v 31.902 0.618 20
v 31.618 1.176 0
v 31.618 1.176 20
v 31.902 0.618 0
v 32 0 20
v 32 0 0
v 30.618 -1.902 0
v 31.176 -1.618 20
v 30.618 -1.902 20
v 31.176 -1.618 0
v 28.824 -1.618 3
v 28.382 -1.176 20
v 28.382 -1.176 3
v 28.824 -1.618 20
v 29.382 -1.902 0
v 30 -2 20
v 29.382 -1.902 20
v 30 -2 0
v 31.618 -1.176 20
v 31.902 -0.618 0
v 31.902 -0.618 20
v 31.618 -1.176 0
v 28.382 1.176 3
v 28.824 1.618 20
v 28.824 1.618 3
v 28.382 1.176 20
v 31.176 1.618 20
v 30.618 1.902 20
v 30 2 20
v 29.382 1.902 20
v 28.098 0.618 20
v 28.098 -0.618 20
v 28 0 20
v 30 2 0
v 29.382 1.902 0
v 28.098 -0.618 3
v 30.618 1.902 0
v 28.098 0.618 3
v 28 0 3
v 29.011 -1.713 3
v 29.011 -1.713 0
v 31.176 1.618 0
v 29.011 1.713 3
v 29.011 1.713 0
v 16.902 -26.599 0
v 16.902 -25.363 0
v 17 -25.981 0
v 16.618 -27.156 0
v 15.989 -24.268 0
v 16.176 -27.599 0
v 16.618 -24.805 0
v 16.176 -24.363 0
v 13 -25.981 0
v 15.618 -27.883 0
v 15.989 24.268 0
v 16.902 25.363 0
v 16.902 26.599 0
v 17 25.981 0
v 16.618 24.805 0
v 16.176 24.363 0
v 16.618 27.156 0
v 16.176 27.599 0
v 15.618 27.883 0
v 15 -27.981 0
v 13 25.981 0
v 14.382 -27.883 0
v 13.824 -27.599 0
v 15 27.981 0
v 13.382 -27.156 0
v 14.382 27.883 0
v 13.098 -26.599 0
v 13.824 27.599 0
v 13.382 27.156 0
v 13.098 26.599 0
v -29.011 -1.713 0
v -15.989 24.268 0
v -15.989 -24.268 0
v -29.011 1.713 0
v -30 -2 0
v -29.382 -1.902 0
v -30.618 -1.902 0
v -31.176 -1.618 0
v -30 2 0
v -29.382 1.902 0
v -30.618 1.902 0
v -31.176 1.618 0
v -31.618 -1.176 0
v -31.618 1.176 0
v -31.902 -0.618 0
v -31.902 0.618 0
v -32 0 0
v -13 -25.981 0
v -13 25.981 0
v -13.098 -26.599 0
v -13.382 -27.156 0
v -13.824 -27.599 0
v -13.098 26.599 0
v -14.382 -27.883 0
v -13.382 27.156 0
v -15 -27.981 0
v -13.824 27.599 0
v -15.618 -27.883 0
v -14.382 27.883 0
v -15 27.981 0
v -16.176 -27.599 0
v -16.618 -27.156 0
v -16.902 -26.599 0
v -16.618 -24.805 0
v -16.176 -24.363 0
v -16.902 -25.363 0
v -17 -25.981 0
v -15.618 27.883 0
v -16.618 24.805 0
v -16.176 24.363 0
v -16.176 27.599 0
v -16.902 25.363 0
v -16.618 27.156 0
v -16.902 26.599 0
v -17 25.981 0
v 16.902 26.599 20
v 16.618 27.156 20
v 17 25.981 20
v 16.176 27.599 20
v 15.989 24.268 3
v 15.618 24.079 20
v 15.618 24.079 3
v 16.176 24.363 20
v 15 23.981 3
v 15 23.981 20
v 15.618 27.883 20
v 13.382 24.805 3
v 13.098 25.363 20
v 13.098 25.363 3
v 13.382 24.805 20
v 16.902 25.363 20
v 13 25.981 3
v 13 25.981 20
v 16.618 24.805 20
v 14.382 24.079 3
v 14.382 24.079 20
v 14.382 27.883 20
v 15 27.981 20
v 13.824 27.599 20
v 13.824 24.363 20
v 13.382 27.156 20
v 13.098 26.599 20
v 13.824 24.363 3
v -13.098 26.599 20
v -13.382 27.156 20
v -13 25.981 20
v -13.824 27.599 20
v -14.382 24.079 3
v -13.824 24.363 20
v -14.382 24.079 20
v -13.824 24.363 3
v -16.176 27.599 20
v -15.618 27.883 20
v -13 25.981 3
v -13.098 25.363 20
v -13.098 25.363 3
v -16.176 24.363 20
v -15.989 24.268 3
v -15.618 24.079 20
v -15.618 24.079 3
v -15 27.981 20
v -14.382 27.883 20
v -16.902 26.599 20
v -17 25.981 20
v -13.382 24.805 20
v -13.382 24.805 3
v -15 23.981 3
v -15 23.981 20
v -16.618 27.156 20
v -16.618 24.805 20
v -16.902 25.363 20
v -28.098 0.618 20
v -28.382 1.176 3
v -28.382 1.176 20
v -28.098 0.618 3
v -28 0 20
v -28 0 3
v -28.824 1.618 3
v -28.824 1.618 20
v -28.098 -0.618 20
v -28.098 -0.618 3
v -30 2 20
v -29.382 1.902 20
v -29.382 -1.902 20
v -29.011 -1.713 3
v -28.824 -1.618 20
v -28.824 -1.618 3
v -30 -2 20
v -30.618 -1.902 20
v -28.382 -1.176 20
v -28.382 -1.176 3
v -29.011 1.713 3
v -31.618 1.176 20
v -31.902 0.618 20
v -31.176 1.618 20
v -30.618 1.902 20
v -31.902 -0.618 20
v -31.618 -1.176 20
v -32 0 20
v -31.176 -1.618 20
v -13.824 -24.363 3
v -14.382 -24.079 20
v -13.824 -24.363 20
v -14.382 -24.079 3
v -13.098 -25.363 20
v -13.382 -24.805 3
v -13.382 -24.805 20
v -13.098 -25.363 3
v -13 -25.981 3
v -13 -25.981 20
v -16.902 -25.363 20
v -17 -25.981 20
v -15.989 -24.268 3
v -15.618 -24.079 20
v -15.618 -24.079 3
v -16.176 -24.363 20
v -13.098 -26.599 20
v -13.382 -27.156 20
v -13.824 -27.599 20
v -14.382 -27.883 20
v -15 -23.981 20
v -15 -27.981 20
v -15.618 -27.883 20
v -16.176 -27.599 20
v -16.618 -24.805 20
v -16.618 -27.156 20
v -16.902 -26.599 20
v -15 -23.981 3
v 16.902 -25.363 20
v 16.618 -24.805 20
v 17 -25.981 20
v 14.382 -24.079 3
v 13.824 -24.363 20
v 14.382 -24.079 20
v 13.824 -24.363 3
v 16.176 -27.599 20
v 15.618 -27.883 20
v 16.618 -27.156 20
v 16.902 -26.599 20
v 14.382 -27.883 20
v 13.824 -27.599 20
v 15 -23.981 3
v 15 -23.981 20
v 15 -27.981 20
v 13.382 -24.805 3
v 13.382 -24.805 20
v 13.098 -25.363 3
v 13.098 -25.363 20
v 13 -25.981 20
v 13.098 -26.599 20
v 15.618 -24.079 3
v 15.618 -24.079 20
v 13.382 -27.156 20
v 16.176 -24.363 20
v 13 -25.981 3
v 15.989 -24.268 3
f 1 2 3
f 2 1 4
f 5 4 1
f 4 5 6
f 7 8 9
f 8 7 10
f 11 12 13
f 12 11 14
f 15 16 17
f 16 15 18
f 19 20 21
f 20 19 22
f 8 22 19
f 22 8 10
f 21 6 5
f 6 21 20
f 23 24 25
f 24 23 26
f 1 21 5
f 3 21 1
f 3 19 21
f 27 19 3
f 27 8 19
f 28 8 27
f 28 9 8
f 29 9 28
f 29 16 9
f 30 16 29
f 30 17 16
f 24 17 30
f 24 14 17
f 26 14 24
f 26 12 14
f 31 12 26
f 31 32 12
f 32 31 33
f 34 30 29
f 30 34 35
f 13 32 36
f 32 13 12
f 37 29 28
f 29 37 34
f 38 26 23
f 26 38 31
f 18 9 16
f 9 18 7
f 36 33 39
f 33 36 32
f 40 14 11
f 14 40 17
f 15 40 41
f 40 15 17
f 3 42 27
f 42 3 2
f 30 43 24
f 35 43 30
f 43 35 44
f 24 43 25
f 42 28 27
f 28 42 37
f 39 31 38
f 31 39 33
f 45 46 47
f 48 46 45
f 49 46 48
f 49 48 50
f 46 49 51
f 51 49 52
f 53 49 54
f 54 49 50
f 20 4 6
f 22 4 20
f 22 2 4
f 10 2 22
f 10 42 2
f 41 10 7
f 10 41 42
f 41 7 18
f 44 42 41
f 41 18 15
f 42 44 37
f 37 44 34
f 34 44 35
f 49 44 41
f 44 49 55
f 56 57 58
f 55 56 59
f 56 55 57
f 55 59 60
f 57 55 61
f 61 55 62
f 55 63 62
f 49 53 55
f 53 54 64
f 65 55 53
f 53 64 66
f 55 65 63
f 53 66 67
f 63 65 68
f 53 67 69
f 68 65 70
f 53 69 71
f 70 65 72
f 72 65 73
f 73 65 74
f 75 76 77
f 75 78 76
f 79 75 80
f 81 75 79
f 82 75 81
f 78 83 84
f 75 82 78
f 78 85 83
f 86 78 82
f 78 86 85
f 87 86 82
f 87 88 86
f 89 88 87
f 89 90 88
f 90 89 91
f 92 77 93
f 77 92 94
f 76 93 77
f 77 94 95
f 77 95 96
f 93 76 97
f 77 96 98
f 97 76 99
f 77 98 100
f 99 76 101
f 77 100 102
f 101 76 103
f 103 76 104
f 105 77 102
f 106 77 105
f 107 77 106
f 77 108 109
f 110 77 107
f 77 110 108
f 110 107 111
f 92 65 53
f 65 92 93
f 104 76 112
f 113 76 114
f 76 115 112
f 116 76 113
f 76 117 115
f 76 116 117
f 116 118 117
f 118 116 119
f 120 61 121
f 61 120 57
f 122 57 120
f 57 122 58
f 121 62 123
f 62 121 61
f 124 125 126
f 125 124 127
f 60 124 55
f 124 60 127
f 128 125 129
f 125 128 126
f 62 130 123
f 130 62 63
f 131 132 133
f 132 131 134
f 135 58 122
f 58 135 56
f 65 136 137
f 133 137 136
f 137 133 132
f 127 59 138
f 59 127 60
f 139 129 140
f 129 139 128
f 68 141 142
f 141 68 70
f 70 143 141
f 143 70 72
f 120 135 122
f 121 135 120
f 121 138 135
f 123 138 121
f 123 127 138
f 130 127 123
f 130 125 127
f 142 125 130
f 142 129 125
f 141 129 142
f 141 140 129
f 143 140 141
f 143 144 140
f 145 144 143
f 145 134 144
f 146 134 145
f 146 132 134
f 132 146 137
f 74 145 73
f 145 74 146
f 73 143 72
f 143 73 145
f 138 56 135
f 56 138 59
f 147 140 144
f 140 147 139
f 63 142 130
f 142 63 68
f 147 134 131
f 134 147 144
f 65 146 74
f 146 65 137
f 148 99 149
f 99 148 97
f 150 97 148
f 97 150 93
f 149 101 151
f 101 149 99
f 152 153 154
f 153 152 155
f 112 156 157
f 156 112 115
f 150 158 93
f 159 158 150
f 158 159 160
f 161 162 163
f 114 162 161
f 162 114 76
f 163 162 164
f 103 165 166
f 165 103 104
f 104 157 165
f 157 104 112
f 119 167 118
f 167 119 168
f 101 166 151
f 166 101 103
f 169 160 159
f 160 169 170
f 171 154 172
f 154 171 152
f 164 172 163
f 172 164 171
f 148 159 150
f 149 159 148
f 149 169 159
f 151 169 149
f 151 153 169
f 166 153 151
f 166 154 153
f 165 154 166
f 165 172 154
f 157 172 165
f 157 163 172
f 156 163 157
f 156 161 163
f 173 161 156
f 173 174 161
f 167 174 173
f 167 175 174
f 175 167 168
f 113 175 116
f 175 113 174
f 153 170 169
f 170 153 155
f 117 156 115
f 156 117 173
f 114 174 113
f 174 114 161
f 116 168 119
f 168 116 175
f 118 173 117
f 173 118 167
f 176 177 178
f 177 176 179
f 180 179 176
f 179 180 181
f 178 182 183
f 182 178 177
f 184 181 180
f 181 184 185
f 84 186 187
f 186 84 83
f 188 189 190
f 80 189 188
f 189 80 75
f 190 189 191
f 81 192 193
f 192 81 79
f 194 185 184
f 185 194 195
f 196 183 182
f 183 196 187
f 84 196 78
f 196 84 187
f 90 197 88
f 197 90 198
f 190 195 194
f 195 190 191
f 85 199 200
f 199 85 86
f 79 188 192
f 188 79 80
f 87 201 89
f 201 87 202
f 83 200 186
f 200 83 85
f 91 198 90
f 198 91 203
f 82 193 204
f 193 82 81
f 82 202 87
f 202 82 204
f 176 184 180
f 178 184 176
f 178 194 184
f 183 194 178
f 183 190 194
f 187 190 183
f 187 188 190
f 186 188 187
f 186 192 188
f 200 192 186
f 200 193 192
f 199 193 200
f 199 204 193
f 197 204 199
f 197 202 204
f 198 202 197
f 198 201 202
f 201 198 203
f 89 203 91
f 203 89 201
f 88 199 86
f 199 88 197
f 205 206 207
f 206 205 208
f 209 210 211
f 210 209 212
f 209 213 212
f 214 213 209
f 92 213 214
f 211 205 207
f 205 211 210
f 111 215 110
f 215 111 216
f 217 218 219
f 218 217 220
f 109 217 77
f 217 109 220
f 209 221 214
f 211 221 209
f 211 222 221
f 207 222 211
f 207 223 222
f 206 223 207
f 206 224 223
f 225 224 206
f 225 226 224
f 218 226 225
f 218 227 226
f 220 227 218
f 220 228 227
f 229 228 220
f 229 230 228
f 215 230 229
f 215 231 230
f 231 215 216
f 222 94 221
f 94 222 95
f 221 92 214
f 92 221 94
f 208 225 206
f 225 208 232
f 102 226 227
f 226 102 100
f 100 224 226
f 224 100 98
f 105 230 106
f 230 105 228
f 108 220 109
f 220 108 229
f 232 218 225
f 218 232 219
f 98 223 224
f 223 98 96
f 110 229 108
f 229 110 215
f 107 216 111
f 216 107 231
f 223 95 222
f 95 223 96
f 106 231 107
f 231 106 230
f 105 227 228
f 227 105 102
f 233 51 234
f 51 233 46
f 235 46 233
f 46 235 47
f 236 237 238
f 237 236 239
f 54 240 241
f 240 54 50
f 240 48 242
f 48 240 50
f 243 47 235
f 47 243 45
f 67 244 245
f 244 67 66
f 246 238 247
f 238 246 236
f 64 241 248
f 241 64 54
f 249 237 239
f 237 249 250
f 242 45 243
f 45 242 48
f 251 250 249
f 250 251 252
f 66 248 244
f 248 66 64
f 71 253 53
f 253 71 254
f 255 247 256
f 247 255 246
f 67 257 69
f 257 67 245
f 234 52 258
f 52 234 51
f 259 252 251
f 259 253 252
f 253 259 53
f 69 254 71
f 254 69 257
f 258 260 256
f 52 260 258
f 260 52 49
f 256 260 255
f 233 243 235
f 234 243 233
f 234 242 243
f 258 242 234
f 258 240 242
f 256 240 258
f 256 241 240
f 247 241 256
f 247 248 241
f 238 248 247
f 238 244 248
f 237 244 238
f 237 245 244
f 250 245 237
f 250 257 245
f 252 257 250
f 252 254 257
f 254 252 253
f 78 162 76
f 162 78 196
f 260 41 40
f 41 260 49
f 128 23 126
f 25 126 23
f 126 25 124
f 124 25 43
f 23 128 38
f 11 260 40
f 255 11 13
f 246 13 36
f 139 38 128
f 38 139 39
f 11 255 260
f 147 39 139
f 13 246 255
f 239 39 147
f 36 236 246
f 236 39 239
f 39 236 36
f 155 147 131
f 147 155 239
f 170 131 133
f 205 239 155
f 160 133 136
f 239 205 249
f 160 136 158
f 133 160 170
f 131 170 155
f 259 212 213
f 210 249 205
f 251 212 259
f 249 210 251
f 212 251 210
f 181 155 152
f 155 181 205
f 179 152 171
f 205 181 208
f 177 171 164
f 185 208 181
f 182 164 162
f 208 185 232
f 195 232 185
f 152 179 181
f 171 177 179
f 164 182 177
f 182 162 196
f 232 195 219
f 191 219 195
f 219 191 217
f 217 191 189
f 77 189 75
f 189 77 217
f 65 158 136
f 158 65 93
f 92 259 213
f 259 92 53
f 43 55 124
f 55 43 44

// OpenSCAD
/*
cube(30);
sphere(15);
cylinder(r=10,h=20);

*/

// translate([1,2,3])
/*
scale([2,0.5,1])
    sphere(15);
*/

//rotate(-45, [1,0,0])
//    cube(10);
/*    
    rotate(-45, [1,1,1])
    cube(10);
    
*/
/*
difference() {
    cube(30, center=true);
    sphere(19);
}

union() {
    cube(30);
    translate([10,10,10])
      cube(30);
}
*/

/*
intersection() {
    sphere(10);
    translate([13,0])
      sphere(10);
}
*/
$fn=20;
tableRadius = 30;
sides=6;
legLen = 20;
dt = 360/sides; //angle per side

p= [for (s=[0:sides]) [tableRadius*cos(s*dt), tableRadius*sin(s*dt)] ];
linear_extrude(height=3)
    polygon(p);
for (s=[0:sides-1]) {
    translate([tableRadius*cos(s*dt), tableRadius*sin(s*dt)])
        cylinder(r=2,h=20);
}
